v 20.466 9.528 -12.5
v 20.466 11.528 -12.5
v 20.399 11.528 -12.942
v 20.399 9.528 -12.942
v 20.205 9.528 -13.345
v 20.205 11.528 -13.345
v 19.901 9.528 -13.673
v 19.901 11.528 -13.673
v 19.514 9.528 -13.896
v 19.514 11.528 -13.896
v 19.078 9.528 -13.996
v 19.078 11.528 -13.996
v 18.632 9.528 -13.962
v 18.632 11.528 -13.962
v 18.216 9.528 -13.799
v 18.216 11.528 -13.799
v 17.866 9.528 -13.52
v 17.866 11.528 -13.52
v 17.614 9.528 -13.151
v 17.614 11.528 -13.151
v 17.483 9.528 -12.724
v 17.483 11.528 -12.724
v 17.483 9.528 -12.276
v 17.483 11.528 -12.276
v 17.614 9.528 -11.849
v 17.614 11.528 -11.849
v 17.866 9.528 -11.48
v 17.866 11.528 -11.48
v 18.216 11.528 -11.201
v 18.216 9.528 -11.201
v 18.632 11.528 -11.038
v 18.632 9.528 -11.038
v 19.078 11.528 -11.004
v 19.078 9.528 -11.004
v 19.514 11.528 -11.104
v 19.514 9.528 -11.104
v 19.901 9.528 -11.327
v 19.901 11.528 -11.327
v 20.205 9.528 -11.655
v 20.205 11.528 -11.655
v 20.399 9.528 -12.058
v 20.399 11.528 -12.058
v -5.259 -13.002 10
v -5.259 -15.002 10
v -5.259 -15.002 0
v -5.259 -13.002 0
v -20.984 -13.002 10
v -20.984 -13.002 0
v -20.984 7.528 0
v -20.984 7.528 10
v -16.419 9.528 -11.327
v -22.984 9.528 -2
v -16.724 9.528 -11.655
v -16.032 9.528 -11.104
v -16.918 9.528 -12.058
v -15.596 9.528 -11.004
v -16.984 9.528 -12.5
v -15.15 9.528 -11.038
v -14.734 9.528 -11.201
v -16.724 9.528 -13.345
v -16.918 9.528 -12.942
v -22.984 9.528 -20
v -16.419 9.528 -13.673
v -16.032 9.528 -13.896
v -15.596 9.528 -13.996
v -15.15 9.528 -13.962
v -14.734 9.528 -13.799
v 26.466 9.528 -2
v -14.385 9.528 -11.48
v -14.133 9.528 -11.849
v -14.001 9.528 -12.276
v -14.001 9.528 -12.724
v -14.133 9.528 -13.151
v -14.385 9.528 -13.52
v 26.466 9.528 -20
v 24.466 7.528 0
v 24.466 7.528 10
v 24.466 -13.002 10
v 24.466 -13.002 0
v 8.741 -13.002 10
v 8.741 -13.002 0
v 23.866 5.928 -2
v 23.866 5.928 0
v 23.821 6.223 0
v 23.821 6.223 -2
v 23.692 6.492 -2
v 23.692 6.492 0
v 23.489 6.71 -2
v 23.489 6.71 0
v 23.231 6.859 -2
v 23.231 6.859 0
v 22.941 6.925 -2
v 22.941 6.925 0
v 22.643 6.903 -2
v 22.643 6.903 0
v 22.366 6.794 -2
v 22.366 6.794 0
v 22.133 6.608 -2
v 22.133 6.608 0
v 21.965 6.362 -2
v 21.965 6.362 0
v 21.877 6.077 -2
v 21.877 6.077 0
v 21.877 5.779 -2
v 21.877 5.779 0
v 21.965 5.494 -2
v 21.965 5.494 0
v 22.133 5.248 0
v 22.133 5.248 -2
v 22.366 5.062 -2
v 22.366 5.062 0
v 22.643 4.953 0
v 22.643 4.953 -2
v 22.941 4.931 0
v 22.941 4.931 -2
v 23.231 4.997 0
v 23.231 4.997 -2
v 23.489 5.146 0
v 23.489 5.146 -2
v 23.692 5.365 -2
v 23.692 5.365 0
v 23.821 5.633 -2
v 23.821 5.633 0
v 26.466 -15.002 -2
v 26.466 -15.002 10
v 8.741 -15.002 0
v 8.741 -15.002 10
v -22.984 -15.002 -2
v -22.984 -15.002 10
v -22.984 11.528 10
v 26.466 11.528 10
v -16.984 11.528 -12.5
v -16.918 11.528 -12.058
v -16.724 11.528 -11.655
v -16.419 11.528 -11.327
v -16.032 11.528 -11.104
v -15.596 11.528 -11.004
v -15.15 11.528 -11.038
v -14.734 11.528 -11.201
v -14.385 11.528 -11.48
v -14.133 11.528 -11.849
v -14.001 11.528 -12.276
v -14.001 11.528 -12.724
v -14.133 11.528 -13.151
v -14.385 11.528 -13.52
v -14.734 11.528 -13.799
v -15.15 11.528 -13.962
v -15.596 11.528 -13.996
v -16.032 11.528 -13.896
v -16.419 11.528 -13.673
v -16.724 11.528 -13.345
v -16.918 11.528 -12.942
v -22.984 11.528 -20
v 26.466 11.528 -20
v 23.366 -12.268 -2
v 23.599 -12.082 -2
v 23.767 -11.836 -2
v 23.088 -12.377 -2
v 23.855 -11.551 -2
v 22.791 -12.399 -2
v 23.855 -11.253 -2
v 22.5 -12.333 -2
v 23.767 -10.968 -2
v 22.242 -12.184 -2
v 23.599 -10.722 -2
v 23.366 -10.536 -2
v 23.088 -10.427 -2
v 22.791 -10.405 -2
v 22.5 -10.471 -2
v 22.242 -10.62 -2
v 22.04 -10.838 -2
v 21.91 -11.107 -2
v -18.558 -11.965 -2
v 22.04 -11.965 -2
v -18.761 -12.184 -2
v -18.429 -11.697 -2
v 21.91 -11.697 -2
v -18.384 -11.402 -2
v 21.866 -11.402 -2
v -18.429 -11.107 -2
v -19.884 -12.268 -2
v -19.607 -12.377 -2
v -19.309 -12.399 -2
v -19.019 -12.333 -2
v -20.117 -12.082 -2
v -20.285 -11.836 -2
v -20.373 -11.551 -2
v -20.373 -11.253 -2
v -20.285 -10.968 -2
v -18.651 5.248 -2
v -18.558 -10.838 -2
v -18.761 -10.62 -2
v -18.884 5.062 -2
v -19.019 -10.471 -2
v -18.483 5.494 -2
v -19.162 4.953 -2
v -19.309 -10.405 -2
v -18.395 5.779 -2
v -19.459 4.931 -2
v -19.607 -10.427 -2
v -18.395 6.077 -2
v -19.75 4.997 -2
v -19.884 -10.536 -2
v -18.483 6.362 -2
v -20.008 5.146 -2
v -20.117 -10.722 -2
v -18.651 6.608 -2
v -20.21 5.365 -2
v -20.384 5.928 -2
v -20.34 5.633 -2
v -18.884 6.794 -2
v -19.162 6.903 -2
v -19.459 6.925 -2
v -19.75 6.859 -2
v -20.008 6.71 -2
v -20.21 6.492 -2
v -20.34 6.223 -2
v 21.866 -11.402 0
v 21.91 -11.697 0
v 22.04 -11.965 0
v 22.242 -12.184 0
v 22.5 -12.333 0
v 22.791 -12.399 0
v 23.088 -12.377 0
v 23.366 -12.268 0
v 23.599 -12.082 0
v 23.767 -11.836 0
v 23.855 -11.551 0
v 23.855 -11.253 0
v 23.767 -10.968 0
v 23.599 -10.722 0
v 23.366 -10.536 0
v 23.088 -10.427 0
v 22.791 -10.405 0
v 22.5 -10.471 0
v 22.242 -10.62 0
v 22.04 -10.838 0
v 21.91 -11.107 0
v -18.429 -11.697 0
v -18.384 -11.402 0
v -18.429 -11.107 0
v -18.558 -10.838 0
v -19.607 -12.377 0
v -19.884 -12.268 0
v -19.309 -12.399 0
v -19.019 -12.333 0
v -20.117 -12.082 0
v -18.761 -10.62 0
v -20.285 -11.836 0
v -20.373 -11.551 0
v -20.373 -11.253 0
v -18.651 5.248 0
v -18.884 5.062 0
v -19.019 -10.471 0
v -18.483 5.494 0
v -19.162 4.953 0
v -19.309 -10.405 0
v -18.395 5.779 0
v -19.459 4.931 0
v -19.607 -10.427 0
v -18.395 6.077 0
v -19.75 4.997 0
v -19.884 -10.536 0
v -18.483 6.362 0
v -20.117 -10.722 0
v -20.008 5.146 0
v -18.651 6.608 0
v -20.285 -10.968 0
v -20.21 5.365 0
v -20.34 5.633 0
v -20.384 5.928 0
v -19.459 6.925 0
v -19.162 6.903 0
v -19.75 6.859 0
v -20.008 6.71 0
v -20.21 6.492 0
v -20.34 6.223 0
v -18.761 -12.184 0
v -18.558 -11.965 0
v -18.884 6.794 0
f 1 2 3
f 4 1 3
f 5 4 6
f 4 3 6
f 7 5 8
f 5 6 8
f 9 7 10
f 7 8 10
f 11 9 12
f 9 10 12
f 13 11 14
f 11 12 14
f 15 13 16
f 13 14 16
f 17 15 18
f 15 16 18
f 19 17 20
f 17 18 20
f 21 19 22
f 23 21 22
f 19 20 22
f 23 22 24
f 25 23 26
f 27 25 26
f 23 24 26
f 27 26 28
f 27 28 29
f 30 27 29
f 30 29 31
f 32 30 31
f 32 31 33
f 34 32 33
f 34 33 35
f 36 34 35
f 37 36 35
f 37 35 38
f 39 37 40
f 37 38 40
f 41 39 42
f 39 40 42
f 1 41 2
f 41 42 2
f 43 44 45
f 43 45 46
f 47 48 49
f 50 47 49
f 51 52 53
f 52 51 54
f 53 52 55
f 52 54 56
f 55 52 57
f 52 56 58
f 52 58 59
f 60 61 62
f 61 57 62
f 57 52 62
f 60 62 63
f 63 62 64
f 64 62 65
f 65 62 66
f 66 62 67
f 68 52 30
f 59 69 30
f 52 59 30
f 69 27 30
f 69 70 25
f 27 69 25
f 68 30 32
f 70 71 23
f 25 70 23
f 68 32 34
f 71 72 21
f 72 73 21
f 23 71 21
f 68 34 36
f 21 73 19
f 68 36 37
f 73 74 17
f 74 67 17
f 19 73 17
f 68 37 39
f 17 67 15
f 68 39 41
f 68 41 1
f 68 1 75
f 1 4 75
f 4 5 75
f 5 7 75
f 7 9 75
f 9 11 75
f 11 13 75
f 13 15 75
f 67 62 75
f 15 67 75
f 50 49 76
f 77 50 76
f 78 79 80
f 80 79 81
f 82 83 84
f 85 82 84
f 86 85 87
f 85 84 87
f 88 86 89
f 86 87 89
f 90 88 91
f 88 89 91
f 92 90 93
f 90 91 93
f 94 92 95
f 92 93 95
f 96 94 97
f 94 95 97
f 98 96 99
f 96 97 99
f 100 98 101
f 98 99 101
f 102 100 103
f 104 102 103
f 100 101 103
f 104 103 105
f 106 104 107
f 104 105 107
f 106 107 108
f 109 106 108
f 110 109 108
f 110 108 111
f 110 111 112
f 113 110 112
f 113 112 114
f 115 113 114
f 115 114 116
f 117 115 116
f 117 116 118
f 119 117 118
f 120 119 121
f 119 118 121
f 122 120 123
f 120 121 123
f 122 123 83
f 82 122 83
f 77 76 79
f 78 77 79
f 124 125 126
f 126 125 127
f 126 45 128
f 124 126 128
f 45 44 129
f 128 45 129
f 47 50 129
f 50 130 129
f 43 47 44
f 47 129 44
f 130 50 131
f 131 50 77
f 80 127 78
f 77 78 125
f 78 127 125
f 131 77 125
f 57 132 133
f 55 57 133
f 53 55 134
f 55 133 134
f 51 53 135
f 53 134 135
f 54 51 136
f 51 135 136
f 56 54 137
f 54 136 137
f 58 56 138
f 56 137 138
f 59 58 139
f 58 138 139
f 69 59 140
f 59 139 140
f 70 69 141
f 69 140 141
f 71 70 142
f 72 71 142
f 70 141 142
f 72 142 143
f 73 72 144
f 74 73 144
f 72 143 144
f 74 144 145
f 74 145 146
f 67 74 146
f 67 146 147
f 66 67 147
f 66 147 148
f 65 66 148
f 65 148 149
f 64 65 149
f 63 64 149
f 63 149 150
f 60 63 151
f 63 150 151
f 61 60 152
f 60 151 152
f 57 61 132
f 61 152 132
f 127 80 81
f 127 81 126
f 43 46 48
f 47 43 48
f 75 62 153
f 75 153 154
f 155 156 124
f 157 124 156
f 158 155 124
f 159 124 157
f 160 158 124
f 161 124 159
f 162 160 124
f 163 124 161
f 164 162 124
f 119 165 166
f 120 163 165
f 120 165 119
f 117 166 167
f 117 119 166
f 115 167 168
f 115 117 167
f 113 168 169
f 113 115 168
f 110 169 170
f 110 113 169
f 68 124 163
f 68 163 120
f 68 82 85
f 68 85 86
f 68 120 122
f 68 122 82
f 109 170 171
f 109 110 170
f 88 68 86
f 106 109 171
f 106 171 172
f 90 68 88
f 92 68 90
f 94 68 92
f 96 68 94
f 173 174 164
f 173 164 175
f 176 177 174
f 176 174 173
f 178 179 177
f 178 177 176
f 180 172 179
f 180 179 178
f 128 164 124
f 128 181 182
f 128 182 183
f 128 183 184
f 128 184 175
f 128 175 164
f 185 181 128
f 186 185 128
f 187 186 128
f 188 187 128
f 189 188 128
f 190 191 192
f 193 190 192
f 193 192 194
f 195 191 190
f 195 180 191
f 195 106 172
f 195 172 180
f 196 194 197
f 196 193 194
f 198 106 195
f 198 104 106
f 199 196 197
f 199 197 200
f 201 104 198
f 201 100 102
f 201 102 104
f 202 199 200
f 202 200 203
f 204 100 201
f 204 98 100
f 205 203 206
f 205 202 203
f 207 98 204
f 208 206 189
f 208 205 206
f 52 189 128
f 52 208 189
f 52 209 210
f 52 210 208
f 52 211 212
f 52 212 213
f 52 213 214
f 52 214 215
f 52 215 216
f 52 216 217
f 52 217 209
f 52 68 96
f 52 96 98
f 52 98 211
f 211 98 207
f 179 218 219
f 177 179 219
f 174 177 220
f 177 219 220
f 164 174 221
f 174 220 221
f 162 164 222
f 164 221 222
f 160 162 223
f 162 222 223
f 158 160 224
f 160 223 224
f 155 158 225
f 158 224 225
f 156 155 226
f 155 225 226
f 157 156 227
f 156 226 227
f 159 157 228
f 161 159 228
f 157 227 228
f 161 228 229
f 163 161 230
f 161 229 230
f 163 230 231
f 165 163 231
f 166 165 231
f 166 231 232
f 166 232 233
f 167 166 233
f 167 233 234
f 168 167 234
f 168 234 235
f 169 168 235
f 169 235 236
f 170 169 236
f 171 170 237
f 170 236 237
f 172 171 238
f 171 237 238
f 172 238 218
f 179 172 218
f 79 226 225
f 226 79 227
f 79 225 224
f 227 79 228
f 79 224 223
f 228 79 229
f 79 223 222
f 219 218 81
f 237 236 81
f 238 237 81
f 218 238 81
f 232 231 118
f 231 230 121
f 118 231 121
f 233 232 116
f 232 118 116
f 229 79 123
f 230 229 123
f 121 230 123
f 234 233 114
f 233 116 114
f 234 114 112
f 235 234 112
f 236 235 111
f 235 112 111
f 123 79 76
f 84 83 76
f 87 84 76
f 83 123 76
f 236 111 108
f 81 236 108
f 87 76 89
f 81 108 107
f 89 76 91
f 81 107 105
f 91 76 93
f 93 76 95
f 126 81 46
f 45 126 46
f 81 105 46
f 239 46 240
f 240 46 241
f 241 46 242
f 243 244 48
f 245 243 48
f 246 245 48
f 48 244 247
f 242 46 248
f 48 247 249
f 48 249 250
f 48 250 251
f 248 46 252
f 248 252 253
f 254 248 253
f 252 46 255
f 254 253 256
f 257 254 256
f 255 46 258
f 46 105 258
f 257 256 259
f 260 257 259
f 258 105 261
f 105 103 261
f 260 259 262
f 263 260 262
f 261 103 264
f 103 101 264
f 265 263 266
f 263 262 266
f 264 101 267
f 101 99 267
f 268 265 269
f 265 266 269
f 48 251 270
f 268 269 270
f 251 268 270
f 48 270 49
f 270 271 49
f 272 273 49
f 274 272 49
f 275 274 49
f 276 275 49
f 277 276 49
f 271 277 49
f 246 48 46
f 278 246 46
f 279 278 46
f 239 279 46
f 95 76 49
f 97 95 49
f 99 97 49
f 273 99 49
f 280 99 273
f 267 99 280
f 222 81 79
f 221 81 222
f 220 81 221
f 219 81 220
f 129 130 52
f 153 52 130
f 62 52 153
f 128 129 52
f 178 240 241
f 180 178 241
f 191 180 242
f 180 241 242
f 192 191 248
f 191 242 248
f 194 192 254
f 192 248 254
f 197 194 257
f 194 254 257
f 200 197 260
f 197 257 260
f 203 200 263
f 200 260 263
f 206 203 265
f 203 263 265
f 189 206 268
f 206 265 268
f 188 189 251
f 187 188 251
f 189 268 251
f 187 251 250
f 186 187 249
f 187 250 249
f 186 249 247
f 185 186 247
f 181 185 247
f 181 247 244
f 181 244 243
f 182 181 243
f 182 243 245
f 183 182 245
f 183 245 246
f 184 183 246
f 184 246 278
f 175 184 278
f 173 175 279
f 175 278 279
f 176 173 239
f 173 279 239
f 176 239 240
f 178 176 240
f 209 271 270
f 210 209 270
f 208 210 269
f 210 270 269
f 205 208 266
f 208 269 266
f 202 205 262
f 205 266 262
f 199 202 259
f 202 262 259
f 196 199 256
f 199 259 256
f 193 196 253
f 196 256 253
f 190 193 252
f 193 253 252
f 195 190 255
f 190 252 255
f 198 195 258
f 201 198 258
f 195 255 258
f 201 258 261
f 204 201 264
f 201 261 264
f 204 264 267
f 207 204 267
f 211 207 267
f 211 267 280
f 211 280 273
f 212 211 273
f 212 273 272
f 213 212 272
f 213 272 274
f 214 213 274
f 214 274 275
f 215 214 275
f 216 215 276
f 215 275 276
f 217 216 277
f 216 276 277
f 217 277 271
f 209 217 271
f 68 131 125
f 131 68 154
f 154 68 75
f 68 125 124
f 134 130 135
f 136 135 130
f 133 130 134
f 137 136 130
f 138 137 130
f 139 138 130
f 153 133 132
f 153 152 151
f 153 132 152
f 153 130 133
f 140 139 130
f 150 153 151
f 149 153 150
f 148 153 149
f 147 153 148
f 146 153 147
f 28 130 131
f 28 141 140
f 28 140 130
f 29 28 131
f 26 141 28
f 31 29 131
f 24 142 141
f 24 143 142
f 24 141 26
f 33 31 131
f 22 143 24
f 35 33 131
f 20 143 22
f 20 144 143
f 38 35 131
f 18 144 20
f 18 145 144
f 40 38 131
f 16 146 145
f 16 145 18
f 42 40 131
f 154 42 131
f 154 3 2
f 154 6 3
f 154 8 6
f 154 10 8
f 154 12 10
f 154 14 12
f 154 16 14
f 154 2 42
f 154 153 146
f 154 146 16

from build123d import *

# Parameters (mm, degrees)
BOSS_EXTRU_1_DEPTH      = 10
ESQUISSE2_W             = 49.45
ESQUISSE2_H             = 24.53
BOSS_EXTRU_2_DEPTH      = 2
ESQUISSE3_R             = 1
ENL_V_MAT_EXTRU_1_DEPTH = 2
ESQUISSE7_W             = 49.45
ESQUISSE7_H             = 30
BOSS_EXTRU_3_DEPTH      = 2
ESQUISSE8_R             = 1.5
ENL_V_MAT_EXTRU_2_DEPTH = 2


with BuildPart() as part:
    # Esquisse1 → Boss.-Extru.1 (new body)
    with BuildSketch(Plane.XY):
        Polygon((8.740819068, -15.001789588), (26.465819068, -15.001789588), (26.465819068, 9.528210412), (-22.984180932, 9.528210412), (-22.984180932, -15.001789588), (-5.259180932, -15.001789588), (-5.259180932, -13.001789588), (-20.984180932, -13.001789588), (-20.984180932, 7.528210412), (24.465819068, 7.528210412), (24.465819068, -13.001789588), (8.740819068, -13.001789588), align=None)
    extrude(amount=BOSS_EXTRU_1_DEPTH)

    # Esquisse2 → Boss.-Extru.2 (add)
    with BuildSketch(Plane(origin=(0, 0, 0), x_dir=(-1, 0, 0), z_dir=(0, 0, -1))):
        with Locations((-1.740819068, -2.736789588)):
            Rectangle(ESQUISSE2_W, ESQUISSE2_H)
    extrude(amount=BOSS_EXTRU_2_DEPTH)

    # Esquisse3 → Enlèv. mat.-Extru.1 (cut)
    with BuildSketch(Plane.XY):
        with Locations((-19.384180932, -11.401789588)):
            Circle(ESQUISSE3_R)
        with Locations(Location((22.865819068, -11.401789588, 0), (0, 0, 180))):
            Circle(ESQUISSE3_R)
        with Locations((22.865819068, 5.928210412)):
            Circle(ESQUISSE3_R)
        with Locations(Location((-19.384180932, 5.928210412, 0), (0, 0, 180))):
            Circle(ESQUISSE3_R)
    extrude(amount=-ENL_V_MAT_EXTRU_1_DEPTH, mode=Mode.SUBTRACT)

    # Esquisse7 → Boss.-Extru.3 (add)
    with BuildSketch(Plane(origin=(0, 9.528210412, 0), x_dir=(1, 0, 0), z_dir=(0, 1, 0))):
        with Locations((1.740819068, 5)):
            Rectangle(ESQUISSE7_W, ESQUISSE7_H)
    extrude(amount=BOSS_EXTRU_3_DEPTH)

    # Esquisse8 → Enlèv. mat.-Extru.2 (cut)
    with BuildSketch(Plane(origin=(0, 11.528210412, 0), x_dir=(1, 0, 0), z_dir=(0, 1, 0))):
        with Locations(Location((-15.484180932, 12.5, 0), (0, 0, 180))):
            Circle(ESQUISSE8_R)
        with Locations((18.965819068, 12.5)):
            Circle(ESQUISSE8_R)
    extrude(amount=-ENL_V_MAT_EXTRU_2_DEPTH, mode=Mode.SUBTRACT)


solid = part.part
